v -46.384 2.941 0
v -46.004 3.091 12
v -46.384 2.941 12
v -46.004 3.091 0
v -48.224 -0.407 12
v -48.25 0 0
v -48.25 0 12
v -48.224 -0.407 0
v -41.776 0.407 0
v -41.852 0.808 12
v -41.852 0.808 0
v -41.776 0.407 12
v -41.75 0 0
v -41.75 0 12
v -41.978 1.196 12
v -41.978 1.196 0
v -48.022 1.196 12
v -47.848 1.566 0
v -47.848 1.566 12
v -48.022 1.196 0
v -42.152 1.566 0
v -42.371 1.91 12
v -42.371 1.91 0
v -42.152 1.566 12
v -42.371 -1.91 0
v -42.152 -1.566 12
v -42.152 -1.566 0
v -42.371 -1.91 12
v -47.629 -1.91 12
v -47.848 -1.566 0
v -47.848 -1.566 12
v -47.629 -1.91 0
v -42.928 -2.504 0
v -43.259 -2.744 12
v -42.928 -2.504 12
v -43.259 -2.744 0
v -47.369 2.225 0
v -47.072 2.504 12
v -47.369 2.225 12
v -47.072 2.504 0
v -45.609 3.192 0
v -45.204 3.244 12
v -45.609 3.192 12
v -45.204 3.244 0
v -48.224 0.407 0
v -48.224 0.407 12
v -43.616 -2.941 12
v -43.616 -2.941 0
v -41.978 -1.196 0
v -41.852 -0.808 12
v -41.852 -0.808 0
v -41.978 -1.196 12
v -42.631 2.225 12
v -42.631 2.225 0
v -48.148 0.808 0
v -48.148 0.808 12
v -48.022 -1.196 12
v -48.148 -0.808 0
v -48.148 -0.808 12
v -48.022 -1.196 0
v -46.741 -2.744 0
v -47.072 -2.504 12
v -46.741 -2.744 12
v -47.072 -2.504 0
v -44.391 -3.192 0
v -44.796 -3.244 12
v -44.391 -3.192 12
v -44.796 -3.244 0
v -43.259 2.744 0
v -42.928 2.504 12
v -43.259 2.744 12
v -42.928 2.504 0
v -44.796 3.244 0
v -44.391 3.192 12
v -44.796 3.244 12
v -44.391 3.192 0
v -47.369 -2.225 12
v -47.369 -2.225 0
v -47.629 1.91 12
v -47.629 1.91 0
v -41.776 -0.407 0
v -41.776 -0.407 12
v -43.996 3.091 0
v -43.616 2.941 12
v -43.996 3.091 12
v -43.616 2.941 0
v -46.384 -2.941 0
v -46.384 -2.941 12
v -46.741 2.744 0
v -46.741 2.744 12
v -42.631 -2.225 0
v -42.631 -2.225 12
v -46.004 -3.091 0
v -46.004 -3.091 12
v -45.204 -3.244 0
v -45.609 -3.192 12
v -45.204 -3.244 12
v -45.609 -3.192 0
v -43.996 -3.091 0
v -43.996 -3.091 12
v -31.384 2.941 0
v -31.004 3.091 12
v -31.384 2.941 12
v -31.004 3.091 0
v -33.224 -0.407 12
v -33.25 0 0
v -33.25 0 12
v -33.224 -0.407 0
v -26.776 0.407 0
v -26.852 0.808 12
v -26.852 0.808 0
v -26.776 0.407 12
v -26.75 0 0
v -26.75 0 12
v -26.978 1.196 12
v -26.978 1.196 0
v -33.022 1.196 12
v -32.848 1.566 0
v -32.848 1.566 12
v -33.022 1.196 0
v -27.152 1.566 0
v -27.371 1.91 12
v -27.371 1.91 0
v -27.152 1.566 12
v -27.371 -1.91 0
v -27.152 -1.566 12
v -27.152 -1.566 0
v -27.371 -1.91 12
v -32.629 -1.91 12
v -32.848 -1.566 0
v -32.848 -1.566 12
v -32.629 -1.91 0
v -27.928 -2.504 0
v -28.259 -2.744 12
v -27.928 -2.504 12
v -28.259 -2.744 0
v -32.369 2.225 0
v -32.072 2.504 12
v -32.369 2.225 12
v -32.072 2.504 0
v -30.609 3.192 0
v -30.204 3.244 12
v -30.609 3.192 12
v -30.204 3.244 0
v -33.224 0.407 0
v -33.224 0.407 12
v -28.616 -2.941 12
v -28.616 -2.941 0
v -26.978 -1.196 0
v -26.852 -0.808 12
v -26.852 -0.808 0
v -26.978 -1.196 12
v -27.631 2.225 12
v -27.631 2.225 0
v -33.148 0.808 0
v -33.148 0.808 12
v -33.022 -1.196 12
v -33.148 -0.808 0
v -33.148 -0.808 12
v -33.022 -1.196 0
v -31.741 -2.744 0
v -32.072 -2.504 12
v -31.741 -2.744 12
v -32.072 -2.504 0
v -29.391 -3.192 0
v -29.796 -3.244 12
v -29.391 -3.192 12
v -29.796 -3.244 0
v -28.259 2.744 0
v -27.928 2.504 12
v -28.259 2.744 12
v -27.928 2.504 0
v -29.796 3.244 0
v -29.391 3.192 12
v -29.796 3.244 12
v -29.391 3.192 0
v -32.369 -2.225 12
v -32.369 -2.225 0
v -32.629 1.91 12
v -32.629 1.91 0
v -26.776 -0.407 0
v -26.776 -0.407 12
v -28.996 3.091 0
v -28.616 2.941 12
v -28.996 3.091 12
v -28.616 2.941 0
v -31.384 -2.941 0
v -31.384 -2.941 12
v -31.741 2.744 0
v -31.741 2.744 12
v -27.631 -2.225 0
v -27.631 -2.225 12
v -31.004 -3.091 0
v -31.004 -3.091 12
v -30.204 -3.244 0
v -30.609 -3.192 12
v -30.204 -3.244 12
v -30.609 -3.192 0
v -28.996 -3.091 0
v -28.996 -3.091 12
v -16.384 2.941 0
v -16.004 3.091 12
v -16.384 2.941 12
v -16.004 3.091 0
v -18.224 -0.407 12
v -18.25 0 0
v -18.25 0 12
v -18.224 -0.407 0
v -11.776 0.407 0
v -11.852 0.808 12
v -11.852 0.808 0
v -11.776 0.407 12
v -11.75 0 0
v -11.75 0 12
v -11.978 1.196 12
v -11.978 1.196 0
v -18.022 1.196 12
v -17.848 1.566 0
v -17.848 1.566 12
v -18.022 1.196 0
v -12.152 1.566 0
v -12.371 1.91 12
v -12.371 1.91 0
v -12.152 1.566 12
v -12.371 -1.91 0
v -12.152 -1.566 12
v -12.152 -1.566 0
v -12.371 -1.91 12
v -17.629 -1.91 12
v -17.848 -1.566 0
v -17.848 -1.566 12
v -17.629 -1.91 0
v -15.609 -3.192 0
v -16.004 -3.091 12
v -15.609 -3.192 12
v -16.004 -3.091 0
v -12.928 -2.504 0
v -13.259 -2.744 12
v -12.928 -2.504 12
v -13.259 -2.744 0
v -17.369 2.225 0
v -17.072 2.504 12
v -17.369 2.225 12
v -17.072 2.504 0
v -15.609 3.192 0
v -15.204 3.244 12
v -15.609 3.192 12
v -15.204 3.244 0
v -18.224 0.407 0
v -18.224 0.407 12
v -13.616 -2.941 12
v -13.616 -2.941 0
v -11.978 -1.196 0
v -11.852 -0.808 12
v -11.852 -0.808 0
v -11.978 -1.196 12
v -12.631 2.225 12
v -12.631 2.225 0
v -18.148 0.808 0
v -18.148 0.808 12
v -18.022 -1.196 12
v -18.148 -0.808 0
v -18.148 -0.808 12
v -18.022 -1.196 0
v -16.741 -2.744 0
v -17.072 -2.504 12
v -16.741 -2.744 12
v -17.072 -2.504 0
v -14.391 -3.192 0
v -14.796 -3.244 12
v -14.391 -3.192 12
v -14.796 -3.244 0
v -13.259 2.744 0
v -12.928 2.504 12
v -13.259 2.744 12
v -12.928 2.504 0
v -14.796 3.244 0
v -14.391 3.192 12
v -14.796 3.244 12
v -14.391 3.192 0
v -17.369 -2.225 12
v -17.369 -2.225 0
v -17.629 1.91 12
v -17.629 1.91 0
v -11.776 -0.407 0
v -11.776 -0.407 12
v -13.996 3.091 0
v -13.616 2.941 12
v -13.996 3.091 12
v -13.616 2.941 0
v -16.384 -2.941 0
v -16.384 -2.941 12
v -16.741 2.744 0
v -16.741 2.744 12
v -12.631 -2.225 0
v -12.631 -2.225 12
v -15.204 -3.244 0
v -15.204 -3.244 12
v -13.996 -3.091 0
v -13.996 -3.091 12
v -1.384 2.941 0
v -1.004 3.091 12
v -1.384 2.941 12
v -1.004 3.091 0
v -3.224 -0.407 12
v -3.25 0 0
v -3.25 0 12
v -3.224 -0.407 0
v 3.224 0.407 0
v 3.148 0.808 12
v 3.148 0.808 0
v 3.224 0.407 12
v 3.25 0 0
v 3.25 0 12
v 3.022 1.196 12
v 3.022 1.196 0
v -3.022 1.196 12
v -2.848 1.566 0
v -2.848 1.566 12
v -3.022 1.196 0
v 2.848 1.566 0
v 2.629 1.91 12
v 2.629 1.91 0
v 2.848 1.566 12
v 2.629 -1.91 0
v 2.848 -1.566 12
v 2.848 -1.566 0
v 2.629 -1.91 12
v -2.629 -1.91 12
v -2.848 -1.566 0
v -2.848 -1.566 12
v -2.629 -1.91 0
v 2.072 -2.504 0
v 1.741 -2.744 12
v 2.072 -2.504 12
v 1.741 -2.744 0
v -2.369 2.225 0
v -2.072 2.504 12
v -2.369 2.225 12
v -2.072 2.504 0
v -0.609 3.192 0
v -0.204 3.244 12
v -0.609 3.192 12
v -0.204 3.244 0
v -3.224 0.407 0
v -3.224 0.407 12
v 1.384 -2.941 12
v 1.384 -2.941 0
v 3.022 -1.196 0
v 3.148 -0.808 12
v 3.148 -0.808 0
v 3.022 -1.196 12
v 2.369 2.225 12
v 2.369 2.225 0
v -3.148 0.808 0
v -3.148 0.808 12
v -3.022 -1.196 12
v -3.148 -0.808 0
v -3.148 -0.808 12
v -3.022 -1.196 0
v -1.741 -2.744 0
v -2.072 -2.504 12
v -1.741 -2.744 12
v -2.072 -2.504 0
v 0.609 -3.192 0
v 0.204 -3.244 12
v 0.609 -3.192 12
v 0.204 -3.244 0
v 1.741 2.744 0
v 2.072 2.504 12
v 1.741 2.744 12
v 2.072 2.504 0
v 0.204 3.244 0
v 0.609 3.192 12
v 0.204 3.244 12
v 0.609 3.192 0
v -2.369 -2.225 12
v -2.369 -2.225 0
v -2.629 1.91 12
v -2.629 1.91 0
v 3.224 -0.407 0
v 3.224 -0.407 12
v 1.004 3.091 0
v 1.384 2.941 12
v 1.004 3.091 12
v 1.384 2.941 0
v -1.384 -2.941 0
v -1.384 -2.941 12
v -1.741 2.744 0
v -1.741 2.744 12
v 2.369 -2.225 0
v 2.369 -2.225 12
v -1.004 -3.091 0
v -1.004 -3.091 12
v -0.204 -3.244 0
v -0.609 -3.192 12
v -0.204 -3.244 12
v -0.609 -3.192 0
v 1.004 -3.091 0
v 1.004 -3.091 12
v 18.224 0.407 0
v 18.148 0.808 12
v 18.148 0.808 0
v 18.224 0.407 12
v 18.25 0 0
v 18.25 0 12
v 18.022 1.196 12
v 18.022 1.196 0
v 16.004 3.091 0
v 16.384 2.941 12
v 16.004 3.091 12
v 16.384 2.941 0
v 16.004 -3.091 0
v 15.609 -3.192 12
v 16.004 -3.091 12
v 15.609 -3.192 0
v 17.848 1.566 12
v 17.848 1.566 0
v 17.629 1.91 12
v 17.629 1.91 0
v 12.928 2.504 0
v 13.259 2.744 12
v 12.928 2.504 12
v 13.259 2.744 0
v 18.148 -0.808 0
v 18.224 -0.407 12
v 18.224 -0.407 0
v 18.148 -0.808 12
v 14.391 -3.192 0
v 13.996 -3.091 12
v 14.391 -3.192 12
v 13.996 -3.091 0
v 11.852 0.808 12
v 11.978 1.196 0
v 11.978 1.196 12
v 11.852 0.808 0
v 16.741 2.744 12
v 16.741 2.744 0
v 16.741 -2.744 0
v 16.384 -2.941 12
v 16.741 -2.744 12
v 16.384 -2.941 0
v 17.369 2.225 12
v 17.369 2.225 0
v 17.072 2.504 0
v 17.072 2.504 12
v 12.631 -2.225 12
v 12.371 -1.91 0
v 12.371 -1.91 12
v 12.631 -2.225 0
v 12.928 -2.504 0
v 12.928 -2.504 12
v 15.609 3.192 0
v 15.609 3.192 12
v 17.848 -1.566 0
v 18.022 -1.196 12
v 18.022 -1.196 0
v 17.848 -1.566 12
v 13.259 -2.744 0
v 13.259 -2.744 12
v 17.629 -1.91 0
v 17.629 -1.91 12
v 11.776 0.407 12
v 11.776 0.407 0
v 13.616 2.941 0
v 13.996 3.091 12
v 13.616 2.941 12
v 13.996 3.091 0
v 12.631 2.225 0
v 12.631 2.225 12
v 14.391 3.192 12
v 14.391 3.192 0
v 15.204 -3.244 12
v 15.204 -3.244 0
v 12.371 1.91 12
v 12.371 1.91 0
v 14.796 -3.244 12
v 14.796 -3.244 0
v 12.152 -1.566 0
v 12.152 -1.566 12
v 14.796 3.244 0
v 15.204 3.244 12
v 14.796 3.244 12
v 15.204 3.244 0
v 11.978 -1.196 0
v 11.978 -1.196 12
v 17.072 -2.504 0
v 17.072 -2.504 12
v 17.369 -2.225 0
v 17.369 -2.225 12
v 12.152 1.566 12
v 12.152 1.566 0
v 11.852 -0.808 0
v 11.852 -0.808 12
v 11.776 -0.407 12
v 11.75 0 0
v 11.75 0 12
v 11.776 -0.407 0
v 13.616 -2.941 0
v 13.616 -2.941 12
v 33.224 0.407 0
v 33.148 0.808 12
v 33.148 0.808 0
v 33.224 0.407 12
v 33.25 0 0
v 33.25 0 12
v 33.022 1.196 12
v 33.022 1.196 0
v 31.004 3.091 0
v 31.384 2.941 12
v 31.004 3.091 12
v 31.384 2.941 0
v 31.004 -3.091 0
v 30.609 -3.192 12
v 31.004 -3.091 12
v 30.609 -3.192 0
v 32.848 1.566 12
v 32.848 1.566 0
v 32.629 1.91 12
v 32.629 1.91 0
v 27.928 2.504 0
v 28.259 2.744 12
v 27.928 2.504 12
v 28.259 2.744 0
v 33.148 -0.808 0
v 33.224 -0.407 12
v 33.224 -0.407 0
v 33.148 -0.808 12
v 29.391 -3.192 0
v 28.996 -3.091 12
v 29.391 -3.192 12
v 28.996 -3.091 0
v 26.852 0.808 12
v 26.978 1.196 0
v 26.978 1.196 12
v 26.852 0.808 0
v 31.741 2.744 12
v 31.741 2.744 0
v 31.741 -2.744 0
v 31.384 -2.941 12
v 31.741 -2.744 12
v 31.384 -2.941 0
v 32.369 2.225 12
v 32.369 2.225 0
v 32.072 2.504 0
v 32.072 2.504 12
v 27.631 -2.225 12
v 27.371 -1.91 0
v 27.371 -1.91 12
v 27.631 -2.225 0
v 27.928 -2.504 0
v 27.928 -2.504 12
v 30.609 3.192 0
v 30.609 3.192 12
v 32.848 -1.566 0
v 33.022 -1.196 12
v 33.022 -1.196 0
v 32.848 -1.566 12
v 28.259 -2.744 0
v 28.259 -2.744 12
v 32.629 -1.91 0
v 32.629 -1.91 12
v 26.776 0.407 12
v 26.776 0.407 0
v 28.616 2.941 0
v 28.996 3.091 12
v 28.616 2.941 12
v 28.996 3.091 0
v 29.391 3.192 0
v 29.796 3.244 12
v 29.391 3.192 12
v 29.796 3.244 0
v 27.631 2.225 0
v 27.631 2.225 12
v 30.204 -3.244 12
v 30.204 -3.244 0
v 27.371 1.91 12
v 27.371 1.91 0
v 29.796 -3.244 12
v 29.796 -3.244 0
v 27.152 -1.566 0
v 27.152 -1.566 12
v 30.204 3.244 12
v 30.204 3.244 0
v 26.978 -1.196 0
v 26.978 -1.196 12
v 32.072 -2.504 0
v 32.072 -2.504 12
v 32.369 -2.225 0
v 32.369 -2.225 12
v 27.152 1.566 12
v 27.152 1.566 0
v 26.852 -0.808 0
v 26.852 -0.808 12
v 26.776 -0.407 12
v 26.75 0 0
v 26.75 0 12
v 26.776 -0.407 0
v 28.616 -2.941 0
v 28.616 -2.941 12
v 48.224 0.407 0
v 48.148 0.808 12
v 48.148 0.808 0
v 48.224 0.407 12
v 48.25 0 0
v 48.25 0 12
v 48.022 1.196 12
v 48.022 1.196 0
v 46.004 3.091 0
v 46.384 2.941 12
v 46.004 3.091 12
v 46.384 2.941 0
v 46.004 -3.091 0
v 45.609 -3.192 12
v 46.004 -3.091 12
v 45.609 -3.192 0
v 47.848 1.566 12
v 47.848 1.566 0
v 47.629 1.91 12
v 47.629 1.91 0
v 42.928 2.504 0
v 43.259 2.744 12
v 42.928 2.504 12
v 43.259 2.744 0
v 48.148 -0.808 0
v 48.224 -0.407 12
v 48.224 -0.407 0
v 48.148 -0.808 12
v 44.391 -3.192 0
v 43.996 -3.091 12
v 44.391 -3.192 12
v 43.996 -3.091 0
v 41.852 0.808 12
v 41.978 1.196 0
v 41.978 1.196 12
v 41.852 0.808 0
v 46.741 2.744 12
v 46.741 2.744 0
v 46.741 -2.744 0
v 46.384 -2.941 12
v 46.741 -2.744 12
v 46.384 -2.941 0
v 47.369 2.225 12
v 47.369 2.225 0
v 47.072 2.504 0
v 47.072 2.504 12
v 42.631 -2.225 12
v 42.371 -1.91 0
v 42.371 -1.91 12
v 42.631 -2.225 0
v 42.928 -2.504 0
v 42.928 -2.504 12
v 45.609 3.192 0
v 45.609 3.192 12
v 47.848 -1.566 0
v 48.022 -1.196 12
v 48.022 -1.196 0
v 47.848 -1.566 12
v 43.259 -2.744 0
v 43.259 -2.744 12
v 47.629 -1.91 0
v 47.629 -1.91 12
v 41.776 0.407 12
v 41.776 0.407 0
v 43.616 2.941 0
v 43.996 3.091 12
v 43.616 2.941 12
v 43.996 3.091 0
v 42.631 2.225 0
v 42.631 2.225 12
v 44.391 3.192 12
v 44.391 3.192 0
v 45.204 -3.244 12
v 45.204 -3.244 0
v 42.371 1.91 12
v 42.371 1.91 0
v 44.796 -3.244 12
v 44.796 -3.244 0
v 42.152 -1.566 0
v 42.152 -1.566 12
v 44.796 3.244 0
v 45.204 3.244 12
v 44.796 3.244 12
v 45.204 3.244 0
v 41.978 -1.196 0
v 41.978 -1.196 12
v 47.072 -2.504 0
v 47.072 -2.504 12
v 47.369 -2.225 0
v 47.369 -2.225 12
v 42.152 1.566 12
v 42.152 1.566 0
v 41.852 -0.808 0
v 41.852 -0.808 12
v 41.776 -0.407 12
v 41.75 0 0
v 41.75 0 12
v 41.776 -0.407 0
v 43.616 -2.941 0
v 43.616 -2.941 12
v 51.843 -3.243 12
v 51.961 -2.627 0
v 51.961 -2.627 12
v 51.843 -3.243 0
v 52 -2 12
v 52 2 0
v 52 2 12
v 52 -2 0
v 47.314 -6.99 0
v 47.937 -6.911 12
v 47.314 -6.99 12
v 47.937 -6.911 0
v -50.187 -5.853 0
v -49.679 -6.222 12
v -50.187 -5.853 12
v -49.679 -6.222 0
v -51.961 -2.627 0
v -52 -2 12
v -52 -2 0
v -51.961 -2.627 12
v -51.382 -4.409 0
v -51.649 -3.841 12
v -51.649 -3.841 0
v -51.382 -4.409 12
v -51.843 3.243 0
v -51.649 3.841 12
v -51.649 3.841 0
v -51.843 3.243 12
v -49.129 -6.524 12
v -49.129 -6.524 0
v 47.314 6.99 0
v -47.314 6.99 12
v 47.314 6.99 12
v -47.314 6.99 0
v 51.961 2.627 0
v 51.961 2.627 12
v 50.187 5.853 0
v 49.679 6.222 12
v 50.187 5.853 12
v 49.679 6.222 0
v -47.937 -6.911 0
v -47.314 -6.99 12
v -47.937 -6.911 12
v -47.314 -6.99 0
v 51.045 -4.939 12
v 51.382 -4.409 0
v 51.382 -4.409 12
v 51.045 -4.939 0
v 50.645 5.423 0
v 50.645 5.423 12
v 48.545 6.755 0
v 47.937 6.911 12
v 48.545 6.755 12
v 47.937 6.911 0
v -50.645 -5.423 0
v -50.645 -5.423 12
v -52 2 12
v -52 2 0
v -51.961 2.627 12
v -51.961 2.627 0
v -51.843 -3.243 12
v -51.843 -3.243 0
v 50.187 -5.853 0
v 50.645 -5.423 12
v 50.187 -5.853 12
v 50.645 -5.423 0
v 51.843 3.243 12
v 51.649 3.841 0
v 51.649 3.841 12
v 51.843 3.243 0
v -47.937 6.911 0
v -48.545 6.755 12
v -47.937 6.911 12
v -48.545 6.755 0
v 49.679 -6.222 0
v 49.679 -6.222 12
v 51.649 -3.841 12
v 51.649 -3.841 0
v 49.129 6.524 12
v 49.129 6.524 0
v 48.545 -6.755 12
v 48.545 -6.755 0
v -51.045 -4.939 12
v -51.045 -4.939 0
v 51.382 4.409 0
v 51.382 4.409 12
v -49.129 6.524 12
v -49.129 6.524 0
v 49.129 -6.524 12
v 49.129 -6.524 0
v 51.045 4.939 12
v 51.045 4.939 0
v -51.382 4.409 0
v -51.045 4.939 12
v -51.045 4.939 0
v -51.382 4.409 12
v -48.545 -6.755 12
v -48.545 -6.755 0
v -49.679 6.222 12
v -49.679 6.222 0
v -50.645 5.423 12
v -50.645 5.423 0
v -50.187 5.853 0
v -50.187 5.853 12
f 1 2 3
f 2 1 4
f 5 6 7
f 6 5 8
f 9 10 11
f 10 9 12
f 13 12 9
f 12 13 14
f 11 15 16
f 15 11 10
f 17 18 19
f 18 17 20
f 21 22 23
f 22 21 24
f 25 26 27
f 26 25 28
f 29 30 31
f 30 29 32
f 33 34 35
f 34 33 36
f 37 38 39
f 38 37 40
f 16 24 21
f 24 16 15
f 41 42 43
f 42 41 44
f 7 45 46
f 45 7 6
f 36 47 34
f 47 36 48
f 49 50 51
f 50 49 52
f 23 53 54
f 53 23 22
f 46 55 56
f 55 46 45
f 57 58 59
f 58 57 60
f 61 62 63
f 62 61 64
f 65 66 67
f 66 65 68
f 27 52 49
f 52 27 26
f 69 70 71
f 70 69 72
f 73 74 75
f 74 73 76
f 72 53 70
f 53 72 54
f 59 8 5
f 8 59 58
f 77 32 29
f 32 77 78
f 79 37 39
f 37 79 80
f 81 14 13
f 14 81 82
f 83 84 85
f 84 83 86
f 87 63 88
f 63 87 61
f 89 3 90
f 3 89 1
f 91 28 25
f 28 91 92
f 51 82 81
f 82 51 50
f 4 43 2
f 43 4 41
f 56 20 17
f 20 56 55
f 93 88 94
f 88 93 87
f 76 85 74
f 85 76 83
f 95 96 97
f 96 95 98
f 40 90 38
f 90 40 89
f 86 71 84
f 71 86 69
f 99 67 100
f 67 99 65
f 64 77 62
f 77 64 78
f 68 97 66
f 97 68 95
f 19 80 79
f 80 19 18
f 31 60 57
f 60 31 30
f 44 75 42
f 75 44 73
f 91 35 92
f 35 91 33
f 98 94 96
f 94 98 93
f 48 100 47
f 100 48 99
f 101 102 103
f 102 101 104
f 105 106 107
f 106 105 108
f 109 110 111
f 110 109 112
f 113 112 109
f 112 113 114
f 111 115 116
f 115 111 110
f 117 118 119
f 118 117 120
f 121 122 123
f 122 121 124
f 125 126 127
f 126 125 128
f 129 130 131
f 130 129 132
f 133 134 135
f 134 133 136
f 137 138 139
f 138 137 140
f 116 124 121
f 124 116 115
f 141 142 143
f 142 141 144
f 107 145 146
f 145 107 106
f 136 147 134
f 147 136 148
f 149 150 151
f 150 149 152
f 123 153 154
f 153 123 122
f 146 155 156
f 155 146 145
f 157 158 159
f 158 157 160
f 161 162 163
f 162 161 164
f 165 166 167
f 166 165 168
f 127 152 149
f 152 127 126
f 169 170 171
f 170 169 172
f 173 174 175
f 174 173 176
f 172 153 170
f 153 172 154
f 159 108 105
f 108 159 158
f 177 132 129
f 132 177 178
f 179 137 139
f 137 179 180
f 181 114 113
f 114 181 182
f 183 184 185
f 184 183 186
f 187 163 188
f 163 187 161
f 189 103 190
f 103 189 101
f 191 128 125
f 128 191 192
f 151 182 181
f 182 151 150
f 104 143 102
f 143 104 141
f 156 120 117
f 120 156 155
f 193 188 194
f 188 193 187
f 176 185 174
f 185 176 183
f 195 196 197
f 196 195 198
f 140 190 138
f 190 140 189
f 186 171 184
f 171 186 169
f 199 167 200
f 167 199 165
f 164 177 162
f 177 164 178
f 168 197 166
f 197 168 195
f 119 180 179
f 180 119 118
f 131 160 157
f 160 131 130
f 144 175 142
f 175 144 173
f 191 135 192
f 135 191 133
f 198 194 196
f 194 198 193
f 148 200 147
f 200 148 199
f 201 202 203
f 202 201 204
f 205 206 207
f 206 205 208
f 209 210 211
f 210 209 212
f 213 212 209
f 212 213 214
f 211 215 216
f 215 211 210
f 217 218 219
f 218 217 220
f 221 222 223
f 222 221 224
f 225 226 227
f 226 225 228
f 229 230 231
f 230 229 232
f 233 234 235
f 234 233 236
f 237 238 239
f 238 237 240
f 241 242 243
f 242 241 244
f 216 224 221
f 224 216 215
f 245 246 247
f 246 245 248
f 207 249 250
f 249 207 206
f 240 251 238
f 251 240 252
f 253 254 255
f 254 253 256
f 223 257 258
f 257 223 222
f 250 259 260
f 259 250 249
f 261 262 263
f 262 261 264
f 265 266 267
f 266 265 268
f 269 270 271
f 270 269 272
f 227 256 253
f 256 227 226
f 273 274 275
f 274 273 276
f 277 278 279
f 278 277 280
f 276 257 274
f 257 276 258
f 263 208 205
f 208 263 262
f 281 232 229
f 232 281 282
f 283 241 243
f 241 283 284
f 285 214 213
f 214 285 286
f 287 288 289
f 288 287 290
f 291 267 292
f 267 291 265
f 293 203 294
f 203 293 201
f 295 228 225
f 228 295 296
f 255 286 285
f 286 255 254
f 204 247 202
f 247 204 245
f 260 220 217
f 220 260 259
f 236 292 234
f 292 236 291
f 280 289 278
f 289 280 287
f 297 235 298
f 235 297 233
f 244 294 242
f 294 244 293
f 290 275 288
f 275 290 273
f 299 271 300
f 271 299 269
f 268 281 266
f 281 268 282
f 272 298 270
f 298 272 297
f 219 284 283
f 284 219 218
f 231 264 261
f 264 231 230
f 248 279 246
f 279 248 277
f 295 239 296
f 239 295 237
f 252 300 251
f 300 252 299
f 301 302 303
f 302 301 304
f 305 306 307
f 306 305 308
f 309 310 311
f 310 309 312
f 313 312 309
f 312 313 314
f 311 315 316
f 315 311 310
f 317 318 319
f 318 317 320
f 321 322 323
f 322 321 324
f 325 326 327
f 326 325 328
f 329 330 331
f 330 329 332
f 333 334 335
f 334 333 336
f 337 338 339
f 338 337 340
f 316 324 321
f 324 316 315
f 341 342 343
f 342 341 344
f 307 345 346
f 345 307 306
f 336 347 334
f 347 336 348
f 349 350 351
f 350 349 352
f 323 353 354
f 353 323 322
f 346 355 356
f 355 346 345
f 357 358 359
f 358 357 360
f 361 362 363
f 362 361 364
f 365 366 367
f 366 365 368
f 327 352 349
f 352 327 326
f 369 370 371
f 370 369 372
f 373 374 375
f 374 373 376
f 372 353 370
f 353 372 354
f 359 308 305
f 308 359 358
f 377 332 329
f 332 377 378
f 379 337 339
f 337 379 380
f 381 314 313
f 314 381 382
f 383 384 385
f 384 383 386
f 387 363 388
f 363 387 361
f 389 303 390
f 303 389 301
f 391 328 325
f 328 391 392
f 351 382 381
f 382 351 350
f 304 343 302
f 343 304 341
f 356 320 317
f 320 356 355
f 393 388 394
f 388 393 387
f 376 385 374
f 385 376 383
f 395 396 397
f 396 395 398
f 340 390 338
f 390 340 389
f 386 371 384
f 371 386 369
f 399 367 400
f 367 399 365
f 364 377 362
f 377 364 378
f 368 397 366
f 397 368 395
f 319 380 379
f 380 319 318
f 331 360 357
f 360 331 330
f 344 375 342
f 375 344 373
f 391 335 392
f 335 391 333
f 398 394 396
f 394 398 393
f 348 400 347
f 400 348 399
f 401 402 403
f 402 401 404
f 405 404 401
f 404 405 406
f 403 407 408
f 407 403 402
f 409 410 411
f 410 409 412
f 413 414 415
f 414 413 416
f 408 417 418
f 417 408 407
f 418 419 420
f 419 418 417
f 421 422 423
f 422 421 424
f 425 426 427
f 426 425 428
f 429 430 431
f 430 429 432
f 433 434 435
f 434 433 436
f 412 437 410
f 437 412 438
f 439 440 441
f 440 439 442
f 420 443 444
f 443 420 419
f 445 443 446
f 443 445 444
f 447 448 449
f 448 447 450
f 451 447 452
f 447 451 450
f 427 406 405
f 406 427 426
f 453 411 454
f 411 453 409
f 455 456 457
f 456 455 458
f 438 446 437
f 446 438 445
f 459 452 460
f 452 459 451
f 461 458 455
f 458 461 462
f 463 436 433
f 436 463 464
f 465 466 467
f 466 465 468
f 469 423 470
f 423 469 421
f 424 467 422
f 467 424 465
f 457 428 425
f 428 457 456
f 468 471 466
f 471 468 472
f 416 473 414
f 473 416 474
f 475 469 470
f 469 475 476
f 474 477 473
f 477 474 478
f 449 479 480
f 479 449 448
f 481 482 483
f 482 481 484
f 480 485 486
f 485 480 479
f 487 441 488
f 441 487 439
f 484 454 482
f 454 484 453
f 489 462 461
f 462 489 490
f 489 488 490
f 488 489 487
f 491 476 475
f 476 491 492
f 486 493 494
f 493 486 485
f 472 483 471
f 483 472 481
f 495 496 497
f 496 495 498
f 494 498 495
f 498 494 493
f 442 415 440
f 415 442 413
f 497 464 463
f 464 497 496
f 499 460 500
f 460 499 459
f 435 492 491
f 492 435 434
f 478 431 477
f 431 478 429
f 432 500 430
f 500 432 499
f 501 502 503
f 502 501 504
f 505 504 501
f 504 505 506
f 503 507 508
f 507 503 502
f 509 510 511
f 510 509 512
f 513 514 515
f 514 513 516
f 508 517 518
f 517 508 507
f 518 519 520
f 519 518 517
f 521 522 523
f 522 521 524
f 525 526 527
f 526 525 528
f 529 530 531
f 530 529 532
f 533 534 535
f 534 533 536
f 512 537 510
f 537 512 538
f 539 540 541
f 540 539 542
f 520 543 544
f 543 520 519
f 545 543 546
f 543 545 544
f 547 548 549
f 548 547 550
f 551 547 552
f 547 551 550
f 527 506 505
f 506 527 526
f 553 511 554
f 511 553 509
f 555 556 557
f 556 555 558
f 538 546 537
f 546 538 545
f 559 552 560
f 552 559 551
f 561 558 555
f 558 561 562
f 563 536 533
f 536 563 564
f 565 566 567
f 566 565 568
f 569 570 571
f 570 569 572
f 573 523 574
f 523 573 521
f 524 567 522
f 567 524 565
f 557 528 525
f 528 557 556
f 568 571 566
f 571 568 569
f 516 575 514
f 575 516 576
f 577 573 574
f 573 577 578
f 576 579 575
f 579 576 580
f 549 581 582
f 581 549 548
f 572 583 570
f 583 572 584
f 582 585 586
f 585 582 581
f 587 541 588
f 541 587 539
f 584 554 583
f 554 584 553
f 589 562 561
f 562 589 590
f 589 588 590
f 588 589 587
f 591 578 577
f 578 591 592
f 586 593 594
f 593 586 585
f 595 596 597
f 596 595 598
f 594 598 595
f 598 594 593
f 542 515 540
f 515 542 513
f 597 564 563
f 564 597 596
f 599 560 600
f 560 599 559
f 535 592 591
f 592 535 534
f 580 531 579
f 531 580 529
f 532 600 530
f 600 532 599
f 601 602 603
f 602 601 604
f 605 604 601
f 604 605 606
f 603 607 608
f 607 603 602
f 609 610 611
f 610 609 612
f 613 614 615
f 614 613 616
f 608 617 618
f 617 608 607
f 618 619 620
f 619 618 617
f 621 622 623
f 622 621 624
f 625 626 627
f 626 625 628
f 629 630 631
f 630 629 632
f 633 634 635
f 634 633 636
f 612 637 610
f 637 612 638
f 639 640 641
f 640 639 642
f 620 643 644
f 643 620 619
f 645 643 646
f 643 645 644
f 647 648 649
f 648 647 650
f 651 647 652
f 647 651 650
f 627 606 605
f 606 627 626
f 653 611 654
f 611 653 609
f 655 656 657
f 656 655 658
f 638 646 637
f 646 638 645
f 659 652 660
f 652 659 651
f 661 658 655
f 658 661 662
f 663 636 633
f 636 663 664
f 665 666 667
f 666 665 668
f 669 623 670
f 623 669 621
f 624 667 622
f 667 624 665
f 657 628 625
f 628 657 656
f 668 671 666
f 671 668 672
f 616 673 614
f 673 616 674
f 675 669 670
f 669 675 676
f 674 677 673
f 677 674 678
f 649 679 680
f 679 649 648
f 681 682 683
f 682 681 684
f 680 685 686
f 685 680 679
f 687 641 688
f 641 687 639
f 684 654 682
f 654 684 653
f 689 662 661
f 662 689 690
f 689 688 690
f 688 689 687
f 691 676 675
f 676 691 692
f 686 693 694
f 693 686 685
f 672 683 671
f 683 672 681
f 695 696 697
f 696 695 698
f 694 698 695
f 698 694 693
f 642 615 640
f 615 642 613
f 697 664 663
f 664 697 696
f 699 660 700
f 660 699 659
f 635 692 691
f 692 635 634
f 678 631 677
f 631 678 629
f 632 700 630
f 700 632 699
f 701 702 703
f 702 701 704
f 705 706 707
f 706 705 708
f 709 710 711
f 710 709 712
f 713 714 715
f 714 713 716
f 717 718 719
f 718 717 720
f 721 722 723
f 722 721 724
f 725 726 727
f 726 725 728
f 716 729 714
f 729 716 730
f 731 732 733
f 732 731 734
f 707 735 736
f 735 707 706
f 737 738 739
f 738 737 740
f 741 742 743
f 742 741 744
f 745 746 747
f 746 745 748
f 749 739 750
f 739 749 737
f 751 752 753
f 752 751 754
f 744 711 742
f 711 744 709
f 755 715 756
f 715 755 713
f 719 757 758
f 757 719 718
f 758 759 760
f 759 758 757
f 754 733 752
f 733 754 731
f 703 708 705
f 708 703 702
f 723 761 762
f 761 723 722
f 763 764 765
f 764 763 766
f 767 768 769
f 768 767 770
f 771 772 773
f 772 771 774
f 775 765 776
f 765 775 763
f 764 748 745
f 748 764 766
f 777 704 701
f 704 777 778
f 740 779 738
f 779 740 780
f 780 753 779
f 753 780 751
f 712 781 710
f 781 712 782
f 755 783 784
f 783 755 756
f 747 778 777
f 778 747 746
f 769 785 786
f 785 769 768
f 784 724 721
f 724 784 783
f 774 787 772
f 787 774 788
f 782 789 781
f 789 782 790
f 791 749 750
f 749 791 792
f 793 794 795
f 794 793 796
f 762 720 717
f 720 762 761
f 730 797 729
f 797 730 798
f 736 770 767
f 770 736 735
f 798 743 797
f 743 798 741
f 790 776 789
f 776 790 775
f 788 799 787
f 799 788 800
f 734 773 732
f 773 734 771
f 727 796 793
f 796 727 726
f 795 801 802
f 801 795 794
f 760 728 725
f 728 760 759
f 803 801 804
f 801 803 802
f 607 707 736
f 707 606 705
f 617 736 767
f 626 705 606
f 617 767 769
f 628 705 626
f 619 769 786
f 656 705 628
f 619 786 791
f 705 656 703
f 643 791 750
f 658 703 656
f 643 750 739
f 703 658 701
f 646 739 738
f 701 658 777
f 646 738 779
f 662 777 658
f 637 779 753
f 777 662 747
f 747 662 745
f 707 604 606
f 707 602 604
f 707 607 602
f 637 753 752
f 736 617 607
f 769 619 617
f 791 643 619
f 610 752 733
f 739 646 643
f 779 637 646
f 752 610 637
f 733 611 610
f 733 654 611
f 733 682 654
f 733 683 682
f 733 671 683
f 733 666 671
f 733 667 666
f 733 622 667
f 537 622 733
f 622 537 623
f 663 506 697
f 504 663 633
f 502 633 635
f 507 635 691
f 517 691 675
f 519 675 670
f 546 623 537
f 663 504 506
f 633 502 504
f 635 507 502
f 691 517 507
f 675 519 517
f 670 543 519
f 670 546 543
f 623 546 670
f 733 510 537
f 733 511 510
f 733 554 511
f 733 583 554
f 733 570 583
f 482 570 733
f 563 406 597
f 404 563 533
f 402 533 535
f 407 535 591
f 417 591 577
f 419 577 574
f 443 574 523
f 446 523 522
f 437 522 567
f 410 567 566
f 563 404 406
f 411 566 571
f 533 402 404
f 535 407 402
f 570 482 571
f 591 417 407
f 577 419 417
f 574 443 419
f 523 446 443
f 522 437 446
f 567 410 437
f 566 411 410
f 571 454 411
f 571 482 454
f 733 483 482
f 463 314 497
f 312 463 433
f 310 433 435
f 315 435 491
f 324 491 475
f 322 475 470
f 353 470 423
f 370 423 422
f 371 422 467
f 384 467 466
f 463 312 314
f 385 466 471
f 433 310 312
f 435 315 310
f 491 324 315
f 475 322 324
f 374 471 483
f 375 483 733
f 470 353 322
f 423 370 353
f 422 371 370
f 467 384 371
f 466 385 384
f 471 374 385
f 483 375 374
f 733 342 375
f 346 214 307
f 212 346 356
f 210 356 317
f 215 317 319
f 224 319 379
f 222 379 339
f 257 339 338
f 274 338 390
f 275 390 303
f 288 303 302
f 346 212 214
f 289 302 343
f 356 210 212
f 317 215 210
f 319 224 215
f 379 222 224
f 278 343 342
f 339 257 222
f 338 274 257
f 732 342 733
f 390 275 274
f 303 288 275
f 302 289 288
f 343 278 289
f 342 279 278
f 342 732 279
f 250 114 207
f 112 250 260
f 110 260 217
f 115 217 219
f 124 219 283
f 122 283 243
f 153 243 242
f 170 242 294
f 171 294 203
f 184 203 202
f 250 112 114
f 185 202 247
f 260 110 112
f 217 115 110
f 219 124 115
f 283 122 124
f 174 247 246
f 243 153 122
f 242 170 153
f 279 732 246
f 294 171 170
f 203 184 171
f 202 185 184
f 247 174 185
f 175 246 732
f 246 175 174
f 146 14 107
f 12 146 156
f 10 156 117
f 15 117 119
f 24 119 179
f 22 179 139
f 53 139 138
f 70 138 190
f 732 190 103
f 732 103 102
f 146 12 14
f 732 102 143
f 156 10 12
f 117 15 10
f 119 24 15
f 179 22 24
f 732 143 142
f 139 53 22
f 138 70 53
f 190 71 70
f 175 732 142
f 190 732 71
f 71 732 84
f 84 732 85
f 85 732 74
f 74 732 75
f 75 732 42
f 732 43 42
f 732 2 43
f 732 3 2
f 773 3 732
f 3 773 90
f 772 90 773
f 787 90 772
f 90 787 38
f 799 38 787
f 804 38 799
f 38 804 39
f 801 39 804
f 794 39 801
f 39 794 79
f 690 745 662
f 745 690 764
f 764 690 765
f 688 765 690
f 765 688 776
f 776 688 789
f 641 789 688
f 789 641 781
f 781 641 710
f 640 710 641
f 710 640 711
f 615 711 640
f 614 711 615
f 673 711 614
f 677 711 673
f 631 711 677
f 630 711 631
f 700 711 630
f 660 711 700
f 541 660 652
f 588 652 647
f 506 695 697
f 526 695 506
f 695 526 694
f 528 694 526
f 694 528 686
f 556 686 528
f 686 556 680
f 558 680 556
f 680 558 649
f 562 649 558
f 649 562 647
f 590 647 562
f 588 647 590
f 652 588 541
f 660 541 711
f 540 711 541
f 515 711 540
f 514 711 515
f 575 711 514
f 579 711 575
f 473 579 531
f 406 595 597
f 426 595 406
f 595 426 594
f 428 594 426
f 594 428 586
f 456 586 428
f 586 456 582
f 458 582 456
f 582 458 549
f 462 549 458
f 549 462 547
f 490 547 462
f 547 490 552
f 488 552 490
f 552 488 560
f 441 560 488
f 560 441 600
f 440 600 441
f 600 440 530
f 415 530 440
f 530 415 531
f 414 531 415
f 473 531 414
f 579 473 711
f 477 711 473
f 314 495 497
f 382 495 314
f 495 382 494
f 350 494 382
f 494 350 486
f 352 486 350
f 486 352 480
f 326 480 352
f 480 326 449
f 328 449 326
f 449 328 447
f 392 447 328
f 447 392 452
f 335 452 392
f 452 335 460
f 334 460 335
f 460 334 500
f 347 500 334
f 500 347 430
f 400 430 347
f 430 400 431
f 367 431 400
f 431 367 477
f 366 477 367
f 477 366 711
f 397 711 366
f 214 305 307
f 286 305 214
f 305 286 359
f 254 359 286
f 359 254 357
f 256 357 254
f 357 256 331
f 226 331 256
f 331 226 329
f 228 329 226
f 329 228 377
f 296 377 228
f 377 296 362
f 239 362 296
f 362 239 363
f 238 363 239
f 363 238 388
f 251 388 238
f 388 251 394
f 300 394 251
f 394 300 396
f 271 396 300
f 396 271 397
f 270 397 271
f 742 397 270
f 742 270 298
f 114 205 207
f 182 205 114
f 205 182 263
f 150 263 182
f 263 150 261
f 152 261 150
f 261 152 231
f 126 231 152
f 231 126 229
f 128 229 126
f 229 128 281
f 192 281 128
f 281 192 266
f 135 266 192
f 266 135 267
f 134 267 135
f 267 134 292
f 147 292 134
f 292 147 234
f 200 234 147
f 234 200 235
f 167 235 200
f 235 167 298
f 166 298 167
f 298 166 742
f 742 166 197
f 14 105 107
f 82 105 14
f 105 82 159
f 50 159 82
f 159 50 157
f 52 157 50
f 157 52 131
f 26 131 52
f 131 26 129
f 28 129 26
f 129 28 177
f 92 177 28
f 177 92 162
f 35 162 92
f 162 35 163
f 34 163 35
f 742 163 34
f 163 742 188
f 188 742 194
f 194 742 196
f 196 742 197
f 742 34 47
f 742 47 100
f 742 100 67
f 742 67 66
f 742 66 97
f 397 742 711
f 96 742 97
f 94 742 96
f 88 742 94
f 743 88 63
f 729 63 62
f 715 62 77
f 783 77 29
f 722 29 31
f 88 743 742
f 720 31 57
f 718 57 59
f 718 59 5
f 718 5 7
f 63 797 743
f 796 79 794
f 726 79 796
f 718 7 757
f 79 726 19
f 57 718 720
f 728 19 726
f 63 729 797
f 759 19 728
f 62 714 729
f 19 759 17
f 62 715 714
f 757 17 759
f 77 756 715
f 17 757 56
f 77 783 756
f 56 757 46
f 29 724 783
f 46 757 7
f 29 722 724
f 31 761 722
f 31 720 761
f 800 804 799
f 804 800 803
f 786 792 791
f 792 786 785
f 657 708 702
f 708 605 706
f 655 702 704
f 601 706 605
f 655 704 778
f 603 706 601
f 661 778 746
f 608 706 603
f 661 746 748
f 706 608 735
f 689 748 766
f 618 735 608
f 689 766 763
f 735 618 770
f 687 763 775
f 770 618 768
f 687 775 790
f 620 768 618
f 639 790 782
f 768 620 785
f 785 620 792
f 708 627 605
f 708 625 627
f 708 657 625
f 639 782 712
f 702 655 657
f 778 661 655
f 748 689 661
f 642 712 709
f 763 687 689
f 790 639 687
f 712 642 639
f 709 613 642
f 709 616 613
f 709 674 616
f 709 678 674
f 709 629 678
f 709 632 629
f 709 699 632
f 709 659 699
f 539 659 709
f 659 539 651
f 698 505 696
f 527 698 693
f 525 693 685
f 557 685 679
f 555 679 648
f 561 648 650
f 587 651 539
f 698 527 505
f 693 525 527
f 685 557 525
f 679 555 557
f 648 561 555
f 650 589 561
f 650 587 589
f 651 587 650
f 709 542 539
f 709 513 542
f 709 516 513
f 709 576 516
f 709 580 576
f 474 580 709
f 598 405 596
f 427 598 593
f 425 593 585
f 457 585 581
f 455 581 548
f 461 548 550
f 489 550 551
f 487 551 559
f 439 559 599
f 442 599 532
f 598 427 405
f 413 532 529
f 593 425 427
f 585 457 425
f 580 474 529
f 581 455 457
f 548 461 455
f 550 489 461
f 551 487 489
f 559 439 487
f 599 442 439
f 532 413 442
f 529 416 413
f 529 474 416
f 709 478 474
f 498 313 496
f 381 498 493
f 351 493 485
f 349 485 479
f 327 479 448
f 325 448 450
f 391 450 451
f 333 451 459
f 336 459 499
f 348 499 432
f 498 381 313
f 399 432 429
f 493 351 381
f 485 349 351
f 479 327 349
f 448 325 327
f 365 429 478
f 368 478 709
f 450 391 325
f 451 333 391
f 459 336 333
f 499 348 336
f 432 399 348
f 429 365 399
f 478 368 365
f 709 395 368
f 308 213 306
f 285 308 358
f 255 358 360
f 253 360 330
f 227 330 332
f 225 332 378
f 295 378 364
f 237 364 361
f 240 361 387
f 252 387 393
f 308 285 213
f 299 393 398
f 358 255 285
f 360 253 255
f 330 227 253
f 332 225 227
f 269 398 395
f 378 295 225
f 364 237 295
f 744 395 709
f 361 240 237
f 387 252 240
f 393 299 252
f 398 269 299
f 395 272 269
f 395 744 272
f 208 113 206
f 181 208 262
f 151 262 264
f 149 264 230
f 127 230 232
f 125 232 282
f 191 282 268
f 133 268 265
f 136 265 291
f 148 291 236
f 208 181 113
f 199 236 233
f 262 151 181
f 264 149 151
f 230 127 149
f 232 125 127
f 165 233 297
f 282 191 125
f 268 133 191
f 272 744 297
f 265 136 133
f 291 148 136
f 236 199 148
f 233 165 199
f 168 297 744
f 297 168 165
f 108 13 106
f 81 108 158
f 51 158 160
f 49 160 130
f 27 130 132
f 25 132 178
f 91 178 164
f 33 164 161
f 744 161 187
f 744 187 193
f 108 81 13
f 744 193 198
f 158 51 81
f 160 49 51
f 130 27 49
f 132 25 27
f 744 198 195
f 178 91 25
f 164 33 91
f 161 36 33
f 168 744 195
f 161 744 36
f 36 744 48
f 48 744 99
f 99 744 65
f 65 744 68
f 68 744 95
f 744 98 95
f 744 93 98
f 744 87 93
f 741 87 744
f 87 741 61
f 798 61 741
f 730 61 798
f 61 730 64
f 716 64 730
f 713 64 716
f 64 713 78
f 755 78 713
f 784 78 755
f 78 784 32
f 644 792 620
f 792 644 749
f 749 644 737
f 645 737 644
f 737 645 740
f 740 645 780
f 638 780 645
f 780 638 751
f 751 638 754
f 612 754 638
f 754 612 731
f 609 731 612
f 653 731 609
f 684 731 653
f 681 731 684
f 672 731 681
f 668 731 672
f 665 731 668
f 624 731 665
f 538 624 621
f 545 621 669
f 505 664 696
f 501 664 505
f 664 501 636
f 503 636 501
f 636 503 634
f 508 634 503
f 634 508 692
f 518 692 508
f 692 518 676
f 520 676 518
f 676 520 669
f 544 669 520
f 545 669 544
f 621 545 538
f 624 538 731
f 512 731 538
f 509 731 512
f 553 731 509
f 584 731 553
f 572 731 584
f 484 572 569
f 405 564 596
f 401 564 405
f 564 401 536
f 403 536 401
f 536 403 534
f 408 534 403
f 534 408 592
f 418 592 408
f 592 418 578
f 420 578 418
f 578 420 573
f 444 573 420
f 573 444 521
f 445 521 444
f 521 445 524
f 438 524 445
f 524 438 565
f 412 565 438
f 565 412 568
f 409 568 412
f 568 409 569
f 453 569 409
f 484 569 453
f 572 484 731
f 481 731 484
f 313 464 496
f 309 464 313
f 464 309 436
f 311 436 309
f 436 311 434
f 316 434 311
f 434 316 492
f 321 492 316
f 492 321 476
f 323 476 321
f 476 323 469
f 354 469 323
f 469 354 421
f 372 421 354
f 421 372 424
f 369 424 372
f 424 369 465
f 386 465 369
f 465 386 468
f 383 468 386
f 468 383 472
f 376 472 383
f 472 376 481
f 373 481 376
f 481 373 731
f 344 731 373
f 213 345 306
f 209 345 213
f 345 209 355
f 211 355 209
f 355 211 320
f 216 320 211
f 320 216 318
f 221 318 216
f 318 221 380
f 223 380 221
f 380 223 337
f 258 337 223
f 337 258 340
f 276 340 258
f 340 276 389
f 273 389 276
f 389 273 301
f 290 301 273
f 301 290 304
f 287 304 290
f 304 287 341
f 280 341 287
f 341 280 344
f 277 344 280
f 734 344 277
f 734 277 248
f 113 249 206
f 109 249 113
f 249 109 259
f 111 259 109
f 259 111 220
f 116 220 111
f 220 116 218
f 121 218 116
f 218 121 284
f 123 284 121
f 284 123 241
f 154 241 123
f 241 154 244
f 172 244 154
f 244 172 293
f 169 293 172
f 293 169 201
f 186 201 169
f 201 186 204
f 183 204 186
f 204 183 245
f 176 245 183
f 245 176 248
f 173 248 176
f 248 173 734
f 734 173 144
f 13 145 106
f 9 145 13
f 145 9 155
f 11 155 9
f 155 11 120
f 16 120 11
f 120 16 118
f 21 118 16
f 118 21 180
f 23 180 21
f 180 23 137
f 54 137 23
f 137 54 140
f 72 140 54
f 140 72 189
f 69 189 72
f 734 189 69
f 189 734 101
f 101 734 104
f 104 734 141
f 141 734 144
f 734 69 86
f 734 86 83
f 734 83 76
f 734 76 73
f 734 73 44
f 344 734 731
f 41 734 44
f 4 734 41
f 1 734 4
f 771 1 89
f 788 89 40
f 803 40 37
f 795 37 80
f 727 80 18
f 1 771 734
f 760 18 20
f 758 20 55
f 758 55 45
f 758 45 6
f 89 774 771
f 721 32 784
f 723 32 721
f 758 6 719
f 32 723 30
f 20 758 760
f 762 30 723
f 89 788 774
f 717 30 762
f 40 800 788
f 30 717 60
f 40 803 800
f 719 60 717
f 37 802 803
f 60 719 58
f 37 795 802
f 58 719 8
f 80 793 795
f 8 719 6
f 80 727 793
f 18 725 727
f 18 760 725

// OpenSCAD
$fn = 50;


difference() {
	union() {
		hull() {
			translate(v = [-47.0000000000, 2.0000000000, 0]) {
				cylinder(h = 12, r = 5);
			}
			translate(v = [47.0000000000, 2.0000000000, 0]) {
				cylinder(h = 12, r = 5);
			}
			translate(v = [-47.0000000000, -2.0000000000, 0]) {
				cylinder(h = 12, r = 5);
			}
			translate(v = [47.0000000000, -2.0000000000, 0]) {
				cylinder(h = 12, r = 5);
			}
		}
	}
	union() {
		translate(v = [-45.0000000000, 0.0000000000, 0]) {
			translate(v = [0, 0, -100]) {
				cylinder(h = 200, r = 3.2500000000);
			}
		}
		translate(v = [-30.0000000000, 0.0000000000, 0]) {
			translate(v = [0, 0, -100]) {
				cylinder(h = 200, r = 3.2500000000);
			}
		}
		translate(v = [-15.0000000000, 0.0000000000, 0]) {
			translate(v = [0, 0, -100]) {
				cylinder(h = 200, r = 3.2500000000);
			}
		}
		translate(v = [0, 0, -100]) {
			cylinder(h = 200, r = 3.2500000000);
		}
		translate(v = [15.0000000000, 0.0000000000, 0]) {
			translate(v = [0, 0, -100]) {
				cylinder(h = 200, r = 3.2500000000);
			}
		}
		translate(v = [30.0000000000, 0.0000000000, 0]) {
			translate(v = [0, 0, -100]) {
				cylinder(h = 200, r = 3.2500000000);
			}
		}
		translate(v = [45.0000000000, 0.0000000000, 0]) {
			translate(v = [0, 0, -100]) {
				cylinder(h = 200, r = 3.2500000000);
			}
		}
	}
}
